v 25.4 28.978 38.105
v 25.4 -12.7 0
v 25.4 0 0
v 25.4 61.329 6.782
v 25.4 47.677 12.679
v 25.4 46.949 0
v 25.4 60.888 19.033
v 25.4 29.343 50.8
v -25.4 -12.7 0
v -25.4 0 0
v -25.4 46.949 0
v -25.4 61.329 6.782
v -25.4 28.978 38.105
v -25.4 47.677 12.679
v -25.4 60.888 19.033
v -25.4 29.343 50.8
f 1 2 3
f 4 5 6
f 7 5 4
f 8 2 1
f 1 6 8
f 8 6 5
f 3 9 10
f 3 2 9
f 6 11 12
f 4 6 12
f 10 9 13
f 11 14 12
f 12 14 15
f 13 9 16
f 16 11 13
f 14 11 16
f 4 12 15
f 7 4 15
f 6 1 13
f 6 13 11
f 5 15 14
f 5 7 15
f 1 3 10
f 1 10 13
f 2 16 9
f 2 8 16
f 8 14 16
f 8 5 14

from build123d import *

# Parameters (mm, degrees)
F1_DEPTH = 25.4
F2_DEPTH = 25.4
F3_DEPTH = 25.4


with BuildPart() as f1:
    # F0 (on Right) → F1 (new body, symmetric)
    with BuildSketch(Plane.YZ):
        Polygon((47.677338, 12.679111), (46.949221, 0), (61.328525, 6.781631), (60.887855, 19.032789), align=None)
    extrude(amount=F1_DEPTH, both=True)

    # F0 (on Right) → F2 (join, symmetric)
    with BuildSketch(Plane.YZ):
        Polygon((29.342864, 50.8), (28.977855, 38.105246), (46.949221, 0), (47.677338, 12.679111), align=None)
    extrude(amount=F2_DEPTH, both=True)

    # F0 (on Right) → F3 (join, symmetric)
    with BuildSketch(Plane.YZ):
        Polygon((-12.7, 0), (0, 0), (28.977855, 38.105246), (29.342864, 50.8), align=None)
    extrude(amount=F3_DEPTH, both=True)


solid = f1.part
